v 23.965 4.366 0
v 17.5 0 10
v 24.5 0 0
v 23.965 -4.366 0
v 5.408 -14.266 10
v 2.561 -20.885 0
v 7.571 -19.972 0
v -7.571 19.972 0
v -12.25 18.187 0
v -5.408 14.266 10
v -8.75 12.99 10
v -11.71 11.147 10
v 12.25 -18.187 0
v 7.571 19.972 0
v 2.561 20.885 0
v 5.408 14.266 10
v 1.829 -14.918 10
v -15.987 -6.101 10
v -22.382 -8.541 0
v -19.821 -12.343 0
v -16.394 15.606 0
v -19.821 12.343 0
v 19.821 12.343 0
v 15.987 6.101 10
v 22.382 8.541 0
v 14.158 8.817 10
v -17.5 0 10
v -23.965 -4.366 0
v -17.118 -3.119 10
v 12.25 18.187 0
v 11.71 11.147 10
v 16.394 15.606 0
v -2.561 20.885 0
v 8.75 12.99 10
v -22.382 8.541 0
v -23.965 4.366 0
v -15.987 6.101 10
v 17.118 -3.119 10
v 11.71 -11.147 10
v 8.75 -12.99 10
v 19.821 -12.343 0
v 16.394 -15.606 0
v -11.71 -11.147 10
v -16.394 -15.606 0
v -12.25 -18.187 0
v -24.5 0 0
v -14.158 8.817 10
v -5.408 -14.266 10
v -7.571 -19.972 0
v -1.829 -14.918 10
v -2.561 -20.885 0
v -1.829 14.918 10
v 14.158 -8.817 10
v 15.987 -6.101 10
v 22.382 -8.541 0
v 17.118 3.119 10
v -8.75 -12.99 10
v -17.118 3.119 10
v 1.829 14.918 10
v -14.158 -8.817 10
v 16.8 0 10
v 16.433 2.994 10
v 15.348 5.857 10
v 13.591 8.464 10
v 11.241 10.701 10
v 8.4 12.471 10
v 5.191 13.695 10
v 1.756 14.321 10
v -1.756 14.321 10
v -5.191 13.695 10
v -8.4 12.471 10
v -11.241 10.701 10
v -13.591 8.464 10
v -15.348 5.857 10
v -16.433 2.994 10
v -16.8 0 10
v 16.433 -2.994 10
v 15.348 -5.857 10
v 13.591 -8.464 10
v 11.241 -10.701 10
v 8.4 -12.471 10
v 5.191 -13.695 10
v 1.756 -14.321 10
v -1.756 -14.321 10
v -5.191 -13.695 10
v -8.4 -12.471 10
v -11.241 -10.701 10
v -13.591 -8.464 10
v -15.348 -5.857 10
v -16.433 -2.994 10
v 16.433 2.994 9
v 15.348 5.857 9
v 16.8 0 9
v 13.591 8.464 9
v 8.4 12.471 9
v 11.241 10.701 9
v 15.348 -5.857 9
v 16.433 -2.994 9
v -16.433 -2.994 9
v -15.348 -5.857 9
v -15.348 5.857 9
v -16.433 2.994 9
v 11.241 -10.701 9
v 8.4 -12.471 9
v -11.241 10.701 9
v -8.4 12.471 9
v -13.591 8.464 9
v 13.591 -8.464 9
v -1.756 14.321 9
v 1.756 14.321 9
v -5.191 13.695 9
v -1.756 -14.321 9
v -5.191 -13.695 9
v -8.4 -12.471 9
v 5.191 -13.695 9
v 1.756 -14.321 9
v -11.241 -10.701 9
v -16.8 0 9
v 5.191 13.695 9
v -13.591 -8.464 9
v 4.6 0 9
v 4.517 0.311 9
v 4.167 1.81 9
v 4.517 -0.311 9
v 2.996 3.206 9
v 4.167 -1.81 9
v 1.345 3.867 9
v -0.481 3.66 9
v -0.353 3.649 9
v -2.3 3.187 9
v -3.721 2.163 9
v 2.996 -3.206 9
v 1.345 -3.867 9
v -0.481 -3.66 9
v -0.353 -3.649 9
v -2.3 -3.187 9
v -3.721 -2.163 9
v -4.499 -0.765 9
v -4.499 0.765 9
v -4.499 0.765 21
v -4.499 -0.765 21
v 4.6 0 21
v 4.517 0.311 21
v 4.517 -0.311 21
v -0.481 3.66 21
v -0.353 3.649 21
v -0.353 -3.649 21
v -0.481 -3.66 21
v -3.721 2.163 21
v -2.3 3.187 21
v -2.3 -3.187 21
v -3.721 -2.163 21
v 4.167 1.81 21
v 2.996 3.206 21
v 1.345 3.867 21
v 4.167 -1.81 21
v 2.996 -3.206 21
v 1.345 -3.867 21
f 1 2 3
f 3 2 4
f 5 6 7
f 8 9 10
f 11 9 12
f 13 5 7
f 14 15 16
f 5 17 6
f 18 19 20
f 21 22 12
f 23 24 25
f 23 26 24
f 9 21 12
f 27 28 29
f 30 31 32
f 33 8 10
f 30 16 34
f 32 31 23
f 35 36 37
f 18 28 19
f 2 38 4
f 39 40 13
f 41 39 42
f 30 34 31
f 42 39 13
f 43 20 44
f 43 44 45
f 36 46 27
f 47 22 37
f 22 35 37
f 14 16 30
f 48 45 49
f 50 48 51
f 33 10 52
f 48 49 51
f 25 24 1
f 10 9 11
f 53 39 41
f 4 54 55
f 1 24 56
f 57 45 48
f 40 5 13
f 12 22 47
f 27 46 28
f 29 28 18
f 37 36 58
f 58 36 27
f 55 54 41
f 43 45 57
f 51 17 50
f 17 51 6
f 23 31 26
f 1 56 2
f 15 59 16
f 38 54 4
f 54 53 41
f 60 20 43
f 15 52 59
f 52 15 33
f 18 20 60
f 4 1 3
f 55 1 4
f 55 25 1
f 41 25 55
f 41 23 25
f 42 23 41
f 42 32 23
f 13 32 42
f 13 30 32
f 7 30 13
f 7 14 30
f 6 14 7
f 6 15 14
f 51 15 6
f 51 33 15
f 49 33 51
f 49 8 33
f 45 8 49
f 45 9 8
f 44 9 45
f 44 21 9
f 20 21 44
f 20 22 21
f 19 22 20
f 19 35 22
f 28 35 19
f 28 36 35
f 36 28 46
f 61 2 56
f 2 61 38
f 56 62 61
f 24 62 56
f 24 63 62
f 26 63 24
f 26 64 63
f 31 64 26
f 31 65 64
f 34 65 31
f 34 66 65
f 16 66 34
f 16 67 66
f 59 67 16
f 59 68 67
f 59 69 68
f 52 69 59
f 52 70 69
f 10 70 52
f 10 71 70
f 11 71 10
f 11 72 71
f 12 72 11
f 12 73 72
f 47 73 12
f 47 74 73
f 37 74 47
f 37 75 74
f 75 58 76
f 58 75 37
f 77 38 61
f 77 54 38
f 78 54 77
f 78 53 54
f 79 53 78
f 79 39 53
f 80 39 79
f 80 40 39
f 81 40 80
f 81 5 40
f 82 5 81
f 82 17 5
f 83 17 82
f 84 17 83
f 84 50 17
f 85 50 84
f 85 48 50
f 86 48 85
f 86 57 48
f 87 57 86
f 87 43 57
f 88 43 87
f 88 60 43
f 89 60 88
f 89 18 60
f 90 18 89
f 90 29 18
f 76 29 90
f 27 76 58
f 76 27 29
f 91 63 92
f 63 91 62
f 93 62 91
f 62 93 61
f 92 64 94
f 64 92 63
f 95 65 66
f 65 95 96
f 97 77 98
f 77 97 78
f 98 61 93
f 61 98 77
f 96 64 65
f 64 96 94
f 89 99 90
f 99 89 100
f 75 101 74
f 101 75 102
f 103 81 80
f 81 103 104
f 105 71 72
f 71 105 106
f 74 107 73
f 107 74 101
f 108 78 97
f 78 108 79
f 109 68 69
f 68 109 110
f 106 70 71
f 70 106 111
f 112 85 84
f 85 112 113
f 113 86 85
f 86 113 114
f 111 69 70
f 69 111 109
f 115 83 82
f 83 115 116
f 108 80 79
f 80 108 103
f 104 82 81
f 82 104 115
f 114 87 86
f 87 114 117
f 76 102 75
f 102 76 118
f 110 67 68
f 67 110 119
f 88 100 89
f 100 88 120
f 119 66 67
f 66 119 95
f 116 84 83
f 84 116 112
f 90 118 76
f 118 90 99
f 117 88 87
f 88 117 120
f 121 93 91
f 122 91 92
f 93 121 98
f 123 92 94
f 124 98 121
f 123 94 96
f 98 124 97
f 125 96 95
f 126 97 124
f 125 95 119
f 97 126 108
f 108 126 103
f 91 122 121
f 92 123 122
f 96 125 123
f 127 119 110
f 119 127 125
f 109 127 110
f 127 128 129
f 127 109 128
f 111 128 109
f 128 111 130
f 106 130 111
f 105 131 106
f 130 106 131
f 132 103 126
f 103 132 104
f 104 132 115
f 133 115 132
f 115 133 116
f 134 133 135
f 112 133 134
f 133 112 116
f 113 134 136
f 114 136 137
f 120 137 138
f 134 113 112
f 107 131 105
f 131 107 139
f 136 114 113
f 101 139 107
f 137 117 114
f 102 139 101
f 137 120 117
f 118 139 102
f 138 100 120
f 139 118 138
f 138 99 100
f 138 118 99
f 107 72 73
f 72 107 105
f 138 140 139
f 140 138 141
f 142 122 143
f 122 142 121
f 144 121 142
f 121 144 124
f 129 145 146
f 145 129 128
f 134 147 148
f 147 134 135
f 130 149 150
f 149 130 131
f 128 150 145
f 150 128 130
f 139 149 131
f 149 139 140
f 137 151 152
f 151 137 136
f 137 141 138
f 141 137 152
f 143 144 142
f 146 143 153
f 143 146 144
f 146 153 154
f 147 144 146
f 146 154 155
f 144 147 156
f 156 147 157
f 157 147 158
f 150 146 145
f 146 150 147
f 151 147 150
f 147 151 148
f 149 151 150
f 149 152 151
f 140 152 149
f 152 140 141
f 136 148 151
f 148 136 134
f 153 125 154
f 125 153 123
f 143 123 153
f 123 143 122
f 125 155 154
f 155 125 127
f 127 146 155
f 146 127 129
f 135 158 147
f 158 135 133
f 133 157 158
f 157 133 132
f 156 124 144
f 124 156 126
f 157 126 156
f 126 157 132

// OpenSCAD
widthStretch = .6;
heightStretch = .7;

difference(){
    scale([heightStretch, widthStretch])
    cylinder(h=10, r1=35, r2=25);
    translate([0, 0, 9])
    scale([heightStretch, widthStretch])
    cylinder(h=1, d=48);
}

scale([1, .8])
cylinder(h=21, d=9.2);

scale([.9, .95])
translate([1, 0, 0])
cylinder(h=21, d=8.2);
